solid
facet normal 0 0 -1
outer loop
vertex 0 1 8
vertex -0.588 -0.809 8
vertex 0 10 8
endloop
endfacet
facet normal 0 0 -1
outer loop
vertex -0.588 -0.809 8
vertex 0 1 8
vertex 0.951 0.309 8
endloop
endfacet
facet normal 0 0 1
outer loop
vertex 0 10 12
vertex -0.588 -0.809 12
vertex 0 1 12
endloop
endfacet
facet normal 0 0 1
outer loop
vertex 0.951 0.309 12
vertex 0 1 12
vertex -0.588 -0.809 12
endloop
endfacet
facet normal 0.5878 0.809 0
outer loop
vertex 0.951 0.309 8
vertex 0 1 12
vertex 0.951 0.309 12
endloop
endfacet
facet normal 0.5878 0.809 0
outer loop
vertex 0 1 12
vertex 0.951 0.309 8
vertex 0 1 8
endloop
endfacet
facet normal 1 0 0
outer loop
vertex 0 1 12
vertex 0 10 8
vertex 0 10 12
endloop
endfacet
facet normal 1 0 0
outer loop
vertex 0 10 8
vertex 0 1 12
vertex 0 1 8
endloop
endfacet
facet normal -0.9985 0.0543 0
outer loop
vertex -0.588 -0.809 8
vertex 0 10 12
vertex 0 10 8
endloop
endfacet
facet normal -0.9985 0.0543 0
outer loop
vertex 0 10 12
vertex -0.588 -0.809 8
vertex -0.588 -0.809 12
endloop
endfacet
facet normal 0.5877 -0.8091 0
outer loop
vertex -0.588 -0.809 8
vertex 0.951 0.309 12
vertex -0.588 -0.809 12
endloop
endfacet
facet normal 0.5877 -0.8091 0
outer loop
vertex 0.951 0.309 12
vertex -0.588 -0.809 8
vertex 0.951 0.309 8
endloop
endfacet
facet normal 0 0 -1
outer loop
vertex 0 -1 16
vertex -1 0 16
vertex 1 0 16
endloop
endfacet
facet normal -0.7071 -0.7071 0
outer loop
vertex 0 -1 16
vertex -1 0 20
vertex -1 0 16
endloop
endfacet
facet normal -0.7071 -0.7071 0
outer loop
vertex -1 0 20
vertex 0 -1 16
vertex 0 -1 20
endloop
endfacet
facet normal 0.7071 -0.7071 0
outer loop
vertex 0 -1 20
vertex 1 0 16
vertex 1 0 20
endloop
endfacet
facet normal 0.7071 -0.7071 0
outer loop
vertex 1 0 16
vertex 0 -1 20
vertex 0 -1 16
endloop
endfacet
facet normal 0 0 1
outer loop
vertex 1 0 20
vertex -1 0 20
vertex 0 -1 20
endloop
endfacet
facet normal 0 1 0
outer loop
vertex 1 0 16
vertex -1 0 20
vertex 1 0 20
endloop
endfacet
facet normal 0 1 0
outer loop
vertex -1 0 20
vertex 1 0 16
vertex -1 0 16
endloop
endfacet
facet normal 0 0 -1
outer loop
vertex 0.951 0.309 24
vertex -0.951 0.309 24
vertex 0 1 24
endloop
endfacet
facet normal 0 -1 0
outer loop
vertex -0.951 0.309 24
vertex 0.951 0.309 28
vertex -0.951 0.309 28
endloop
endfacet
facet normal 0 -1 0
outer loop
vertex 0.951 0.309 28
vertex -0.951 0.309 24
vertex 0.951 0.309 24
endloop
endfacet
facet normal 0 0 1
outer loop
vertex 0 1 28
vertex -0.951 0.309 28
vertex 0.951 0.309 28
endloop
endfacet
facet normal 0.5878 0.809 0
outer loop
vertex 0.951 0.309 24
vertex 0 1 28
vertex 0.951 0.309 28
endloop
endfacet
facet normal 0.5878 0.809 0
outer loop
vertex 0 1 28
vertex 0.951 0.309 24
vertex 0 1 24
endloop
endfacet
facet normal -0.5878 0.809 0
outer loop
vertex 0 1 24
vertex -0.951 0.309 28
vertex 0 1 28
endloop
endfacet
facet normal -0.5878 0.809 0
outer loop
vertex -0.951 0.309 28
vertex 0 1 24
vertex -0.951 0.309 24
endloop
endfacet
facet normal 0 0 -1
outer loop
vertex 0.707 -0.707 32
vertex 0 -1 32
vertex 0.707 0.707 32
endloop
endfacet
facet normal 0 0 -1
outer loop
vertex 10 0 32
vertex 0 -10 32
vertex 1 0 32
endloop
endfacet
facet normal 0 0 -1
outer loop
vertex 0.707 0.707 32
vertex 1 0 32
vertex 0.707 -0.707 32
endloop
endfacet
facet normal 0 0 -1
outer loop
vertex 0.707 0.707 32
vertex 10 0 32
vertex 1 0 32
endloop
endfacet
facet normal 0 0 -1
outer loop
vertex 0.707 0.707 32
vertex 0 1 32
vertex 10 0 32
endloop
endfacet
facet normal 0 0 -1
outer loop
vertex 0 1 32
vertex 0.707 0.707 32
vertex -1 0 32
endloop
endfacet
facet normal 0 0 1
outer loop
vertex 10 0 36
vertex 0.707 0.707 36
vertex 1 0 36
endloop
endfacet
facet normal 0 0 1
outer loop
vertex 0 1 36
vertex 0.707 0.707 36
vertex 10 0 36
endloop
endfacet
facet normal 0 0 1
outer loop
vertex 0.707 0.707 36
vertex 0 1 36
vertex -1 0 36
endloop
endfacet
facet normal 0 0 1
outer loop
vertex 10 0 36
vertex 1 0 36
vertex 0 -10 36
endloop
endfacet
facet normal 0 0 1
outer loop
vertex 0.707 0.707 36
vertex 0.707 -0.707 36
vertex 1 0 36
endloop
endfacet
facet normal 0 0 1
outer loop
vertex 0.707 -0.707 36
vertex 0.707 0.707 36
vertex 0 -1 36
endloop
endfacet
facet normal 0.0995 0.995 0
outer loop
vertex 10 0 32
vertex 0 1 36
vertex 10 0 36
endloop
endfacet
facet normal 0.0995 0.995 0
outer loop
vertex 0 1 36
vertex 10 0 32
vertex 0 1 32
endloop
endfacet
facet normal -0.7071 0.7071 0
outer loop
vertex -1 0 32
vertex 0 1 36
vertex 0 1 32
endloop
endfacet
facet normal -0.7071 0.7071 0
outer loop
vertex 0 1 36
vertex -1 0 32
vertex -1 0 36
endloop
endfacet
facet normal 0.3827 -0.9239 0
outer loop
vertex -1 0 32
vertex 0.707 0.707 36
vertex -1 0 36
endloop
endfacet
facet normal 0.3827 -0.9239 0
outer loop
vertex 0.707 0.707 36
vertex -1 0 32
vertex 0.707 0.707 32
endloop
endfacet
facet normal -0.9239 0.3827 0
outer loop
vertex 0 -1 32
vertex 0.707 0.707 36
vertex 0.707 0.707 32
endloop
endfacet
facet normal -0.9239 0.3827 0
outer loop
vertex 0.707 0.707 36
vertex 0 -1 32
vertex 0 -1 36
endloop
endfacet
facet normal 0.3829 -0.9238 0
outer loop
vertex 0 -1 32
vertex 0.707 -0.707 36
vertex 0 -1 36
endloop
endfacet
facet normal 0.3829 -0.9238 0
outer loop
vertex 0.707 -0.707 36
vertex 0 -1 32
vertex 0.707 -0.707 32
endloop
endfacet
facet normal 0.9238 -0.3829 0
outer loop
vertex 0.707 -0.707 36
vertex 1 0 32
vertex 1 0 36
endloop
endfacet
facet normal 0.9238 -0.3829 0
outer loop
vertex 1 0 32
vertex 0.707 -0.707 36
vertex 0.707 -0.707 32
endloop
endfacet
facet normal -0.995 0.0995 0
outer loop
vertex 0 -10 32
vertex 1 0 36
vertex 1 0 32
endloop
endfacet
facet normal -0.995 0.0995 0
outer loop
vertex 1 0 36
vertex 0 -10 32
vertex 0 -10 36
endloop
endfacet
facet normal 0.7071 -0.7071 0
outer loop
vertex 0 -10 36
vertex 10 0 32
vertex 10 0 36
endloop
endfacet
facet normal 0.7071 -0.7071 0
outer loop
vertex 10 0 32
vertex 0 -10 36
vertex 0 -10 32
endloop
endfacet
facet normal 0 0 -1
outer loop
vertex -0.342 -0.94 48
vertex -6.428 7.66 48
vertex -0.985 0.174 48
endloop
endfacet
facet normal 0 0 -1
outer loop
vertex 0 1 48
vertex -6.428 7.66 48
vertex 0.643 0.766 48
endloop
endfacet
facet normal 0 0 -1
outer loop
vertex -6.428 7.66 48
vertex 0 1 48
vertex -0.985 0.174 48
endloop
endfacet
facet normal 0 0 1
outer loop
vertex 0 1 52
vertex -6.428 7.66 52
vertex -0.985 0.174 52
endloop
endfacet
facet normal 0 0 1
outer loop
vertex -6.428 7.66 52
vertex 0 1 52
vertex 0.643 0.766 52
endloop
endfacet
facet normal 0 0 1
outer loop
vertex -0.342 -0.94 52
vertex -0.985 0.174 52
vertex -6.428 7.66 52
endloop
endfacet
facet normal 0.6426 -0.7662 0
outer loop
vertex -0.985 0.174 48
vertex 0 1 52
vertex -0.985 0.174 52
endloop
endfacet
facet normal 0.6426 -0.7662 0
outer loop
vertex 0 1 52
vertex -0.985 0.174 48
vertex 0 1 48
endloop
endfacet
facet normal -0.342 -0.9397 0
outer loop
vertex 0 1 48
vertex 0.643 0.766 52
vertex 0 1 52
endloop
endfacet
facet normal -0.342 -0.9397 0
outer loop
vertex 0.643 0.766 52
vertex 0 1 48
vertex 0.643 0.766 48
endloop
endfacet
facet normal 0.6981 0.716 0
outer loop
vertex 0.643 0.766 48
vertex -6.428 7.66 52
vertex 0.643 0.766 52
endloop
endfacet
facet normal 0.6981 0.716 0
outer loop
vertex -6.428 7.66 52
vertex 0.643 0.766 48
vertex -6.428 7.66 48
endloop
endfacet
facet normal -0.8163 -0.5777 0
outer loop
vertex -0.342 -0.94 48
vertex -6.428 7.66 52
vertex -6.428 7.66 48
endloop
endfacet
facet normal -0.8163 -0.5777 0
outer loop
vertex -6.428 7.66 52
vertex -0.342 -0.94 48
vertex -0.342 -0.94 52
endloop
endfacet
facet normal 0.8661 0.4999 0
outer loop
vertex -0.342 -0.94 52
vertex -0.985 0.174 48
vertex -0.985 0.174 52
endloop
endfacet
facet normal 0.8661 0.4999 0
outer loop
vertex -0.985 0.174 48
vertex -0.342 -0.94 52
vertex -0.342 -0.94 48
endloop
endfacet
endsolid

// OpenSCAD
union() {
	translate(v = [0, 0, 0]) {
		linear_extrude(height = 4) {
			polygon(paths = [[0, 1, 2, 3, 4, 5, 6, 7, 8]], points = [[-0.342020143326, -0.939692620786], [-0.984807753012, 0.173648177667], [0.866025403784, -0.5], [-0.866025403784, -0.5], [0.342020143326, -0.939692620786], [-0.866025403784, -0.5], [0.642787609687, 0.766044443119], [-0.866025403784, -0.5], [0.984807753012, 0.173648177667]]);
		}
	}
	translate(v = [0, 0, 4]) {
		linear_extrude(height = 4) {
			polygon(paths = [[0, 1, 2, 3, 4, 5, 6, 7]], points = [[0.707106781187, 0.707106781187], [-0.707106781187, 0.707106781187], [-0.707106781187, 0.707106781187], [1.0, 5.51091059616e-16], [-0.707106781187, 0.707106781187], [0.707106781187, 0.707106781187], [0.707106781187, 0.707106781187], [-1.0, -3.18470065842e-15]]);
		}
	}
	translate(v = [0, 0, 8]) {
		linear_extrude(height = 4) {
			polygon(paths = [[0, 1, 2, 3, 4]], points = [[-2.44929359829e-16, 1.0], [-4.89858719659e-15, 10.0], [-0.587785252292, -0.809016994375], [0.951056516295, 0.309016994375], [-2.44929359829e-15, 1.0]]);
		}
	}
	translate(v = [0, 0, 12]) {
		linear_extrude(height = 4) {
			polygon(paths = [[0, 1, 2, 3, 4, 5, 6, 7]], points = [[0.707106781187, -0.707106781187], [-1.0, -1.83697019872e-16], [0.707106781187, 0.707106781187], [-0.707106781187, -0.707106781187], [7.07106781187, 7.07106781187], [-1.0, -2.44991257893e-15], [-9.79717439318e-16, 1.0], [4.89982515786e-15, -1.0]]);
		}
	}
	translate(v = [0, 0, 16]) {
		linear_extrude(height = 4) {
			polygon(paths = [[0, 1, 2, 3]], points = [[-1.0, -3.18470065842e-15], [1.0, -2.45548340466e-16], [-9.80955400591e-16, -1.0], [-1.0, -4.40934745757e-15]]);
		}
	}
	translate(v = [0, 0, 20]) {
		linear_extrude(height = 4) {
			polygon(paths = [[0, 1, 2, 3]], points = [[-2.44929359829e-16, 1.0], [1.0, 3.06161699787e-16], [1.0, 9.79098458681e-16], [1.0, 8.32945517611e-15]]);
		}
	}
	translate(v = [0, 0, 24]) {
		linear_extrude(height = 4) {
			polygon(paths = [[0, 1, 2, 3, 4]], points = [[0.951056516295, 0.309016994375], [0.587785252292, -0.809016994375], [0.951056516295, 0.309016994375], [-1.71450551881e-15, 1.0], [-0.951056516295, 0.309016994375]]);
		}
	}
	translate(v = [0, 0, 28]) {
		linear_extrude(height = 4) {
			polygon(paths = [[0, 1, 2, 3]], points = [[-2.44929359829e-16, 1.0], [-1.95943487864e-15, 1.0], [-2.20436423847e-15, 1.0], [-9.79965031573e-15, 1.0]]);
		}
	}
	translate(v = [0, 0, 32]) {
		linear_extrude(height = 4) {
			polygon(paths = [[0, 1, 2, 3, 4, 5, 6, 7]], points = [[0.707106781187, -0.707106781187], [3.67394039744e-16, -1.0], [0.707106781187, 0.707106781187], [-1.0, -2.69484193876e-15], [-9.79717439318e-16, 1.0], [10.0, -7.35407060125e-15], [1.10218211923e-14, -10.0], [1.0, -4.90477700296e-16]]);
		}
	}
	translate(v = [0, 0, 36]) {
		linear_extrude(height = 4) {
			polygon(paths = [[0, 1, 2, 3, 4, 5, 6]], points = [[-0.433883739118, -0.900968867902], [-0.974927912182, -0.222520933956], [-7.34788079488e-16, 1.0], [0.433883739118, -0.900968867902], [0.974927912182, -0.222520933956], [-0.433883739118, -0.900968867902], [-1.71450551881e-15, 1.0]]);
		}
	}
	translate(v = [0, 0, 40]) {
		linear_extrude(height = 4) {
			polygon(paths = [[0, 1, 2, 3, 4, 5, 6, 7, 8, 9]], points = [[-0.951056516295, 0.309016994375], [0.587785252292, 0.809016994375], [5.87785252292, -8.09016994375], [-7.34788079488e-15, 10.0], [9.51056516295, 3.09016994375], [0.587785252292, -0.809016994375], [-9.79717439318e-16, 1.0], [0.951056516295, 0.309016994375], [1.10218211923e-15, -1.0], [-0.951056516295, -0.309016994375]]);
		}
	}
	translate(v = [0, 0, 44]) {
		linear_extrude(height = 4) {
			polygon(paths = [[0, 1, 2, 3, 4, 5, 6, 7, 8, 9, 10, 11, 12, 13]], points = [[0.974927912182, 0.222520933956], [0.974927912182, -0.222520933956], [0.781831482468, 0.623489801859], [0.781831482468, -0.623489801859], [3.67394039744e-16, -1.0], [-15.6366296494, 12.4697960372], [-4.89858719659e-16, 1.0], [0.433883739118, 0.900968867902], [0.974927912182, -0.222520933956], [6.12323399574e-16, -1.0], [-0.433883739118, -0.900968867902], [-9.74927912182, -2.22520933956], [-7.34788079488e-16, 1.0], [-0.781831482468, -0.623489801859]]);
		}
	}
	translate(v = [0, 0, 48]) {
		linear_extrude(height = 4) {
			polygon(paths = [[0, 1, 2, 3, 4, 5, 6, 7, 8]], points = [[0.342020143326, -0.939692620786], [0.642787609687, 0.766044443119], [0.342020143326, -0.939692620786], [-0.342020143326, -0.939692620786], [-0.984807753012, 0.173648177667], [-7.34788079488e-16, 1.0], [0.642787609687, 0.766044443119], [-6.42787609687, 7.66044443119], [-0.342020143326, -0.939692620786]]);
		}
	}
	translate(v = [0, 0, 52]) {
		linear_extrude(height = 4) {
			polygon(paths = [[0, 1, 2, 3, 4, 5, 6, 7, 8]], points = [[-0.866025403784, -0.5], [-2.44929359829e-16, 1.0], [0.866025403784, -0.5], [0.342020143326, -0.939692620786], [-3.42020143326, -9.39692620786], [-0.342020143326, -0.939692620786], [-0.866025403784, -0.5], [0.642787609687, 0.766044443119], [0.342020143326, -0.939692620786]]);
		}
	}
	translate(v = [0, 0, 56]) {
		linear_extrude(height = 4) {
			polygon(paths = [[0, 1, 2, 3, 4, 5, 6, 7, 8, 9, 10, 11, 12]], points = [[0.464723172044, 0.885456025653], [0.239315664288, -0.970941817426], [-0.464723172044, 0.885456025653], [0.992708874098, 0.120536680255], [0.239315664288, -0.970941817426], [-0.822983865894, 0.568064746731], [-4.89858719659e-16, 1.0], [0.935016242685, -0.354604887043], [-0.464723172044, 0.885456025653], [0.935016242685, -0.354604887043], [0.239315664288, -0.970941817426], [-0.663122658241, -0.748510748171], [-9.92708874098, 1.20536680255]]);
		}
	}
}
